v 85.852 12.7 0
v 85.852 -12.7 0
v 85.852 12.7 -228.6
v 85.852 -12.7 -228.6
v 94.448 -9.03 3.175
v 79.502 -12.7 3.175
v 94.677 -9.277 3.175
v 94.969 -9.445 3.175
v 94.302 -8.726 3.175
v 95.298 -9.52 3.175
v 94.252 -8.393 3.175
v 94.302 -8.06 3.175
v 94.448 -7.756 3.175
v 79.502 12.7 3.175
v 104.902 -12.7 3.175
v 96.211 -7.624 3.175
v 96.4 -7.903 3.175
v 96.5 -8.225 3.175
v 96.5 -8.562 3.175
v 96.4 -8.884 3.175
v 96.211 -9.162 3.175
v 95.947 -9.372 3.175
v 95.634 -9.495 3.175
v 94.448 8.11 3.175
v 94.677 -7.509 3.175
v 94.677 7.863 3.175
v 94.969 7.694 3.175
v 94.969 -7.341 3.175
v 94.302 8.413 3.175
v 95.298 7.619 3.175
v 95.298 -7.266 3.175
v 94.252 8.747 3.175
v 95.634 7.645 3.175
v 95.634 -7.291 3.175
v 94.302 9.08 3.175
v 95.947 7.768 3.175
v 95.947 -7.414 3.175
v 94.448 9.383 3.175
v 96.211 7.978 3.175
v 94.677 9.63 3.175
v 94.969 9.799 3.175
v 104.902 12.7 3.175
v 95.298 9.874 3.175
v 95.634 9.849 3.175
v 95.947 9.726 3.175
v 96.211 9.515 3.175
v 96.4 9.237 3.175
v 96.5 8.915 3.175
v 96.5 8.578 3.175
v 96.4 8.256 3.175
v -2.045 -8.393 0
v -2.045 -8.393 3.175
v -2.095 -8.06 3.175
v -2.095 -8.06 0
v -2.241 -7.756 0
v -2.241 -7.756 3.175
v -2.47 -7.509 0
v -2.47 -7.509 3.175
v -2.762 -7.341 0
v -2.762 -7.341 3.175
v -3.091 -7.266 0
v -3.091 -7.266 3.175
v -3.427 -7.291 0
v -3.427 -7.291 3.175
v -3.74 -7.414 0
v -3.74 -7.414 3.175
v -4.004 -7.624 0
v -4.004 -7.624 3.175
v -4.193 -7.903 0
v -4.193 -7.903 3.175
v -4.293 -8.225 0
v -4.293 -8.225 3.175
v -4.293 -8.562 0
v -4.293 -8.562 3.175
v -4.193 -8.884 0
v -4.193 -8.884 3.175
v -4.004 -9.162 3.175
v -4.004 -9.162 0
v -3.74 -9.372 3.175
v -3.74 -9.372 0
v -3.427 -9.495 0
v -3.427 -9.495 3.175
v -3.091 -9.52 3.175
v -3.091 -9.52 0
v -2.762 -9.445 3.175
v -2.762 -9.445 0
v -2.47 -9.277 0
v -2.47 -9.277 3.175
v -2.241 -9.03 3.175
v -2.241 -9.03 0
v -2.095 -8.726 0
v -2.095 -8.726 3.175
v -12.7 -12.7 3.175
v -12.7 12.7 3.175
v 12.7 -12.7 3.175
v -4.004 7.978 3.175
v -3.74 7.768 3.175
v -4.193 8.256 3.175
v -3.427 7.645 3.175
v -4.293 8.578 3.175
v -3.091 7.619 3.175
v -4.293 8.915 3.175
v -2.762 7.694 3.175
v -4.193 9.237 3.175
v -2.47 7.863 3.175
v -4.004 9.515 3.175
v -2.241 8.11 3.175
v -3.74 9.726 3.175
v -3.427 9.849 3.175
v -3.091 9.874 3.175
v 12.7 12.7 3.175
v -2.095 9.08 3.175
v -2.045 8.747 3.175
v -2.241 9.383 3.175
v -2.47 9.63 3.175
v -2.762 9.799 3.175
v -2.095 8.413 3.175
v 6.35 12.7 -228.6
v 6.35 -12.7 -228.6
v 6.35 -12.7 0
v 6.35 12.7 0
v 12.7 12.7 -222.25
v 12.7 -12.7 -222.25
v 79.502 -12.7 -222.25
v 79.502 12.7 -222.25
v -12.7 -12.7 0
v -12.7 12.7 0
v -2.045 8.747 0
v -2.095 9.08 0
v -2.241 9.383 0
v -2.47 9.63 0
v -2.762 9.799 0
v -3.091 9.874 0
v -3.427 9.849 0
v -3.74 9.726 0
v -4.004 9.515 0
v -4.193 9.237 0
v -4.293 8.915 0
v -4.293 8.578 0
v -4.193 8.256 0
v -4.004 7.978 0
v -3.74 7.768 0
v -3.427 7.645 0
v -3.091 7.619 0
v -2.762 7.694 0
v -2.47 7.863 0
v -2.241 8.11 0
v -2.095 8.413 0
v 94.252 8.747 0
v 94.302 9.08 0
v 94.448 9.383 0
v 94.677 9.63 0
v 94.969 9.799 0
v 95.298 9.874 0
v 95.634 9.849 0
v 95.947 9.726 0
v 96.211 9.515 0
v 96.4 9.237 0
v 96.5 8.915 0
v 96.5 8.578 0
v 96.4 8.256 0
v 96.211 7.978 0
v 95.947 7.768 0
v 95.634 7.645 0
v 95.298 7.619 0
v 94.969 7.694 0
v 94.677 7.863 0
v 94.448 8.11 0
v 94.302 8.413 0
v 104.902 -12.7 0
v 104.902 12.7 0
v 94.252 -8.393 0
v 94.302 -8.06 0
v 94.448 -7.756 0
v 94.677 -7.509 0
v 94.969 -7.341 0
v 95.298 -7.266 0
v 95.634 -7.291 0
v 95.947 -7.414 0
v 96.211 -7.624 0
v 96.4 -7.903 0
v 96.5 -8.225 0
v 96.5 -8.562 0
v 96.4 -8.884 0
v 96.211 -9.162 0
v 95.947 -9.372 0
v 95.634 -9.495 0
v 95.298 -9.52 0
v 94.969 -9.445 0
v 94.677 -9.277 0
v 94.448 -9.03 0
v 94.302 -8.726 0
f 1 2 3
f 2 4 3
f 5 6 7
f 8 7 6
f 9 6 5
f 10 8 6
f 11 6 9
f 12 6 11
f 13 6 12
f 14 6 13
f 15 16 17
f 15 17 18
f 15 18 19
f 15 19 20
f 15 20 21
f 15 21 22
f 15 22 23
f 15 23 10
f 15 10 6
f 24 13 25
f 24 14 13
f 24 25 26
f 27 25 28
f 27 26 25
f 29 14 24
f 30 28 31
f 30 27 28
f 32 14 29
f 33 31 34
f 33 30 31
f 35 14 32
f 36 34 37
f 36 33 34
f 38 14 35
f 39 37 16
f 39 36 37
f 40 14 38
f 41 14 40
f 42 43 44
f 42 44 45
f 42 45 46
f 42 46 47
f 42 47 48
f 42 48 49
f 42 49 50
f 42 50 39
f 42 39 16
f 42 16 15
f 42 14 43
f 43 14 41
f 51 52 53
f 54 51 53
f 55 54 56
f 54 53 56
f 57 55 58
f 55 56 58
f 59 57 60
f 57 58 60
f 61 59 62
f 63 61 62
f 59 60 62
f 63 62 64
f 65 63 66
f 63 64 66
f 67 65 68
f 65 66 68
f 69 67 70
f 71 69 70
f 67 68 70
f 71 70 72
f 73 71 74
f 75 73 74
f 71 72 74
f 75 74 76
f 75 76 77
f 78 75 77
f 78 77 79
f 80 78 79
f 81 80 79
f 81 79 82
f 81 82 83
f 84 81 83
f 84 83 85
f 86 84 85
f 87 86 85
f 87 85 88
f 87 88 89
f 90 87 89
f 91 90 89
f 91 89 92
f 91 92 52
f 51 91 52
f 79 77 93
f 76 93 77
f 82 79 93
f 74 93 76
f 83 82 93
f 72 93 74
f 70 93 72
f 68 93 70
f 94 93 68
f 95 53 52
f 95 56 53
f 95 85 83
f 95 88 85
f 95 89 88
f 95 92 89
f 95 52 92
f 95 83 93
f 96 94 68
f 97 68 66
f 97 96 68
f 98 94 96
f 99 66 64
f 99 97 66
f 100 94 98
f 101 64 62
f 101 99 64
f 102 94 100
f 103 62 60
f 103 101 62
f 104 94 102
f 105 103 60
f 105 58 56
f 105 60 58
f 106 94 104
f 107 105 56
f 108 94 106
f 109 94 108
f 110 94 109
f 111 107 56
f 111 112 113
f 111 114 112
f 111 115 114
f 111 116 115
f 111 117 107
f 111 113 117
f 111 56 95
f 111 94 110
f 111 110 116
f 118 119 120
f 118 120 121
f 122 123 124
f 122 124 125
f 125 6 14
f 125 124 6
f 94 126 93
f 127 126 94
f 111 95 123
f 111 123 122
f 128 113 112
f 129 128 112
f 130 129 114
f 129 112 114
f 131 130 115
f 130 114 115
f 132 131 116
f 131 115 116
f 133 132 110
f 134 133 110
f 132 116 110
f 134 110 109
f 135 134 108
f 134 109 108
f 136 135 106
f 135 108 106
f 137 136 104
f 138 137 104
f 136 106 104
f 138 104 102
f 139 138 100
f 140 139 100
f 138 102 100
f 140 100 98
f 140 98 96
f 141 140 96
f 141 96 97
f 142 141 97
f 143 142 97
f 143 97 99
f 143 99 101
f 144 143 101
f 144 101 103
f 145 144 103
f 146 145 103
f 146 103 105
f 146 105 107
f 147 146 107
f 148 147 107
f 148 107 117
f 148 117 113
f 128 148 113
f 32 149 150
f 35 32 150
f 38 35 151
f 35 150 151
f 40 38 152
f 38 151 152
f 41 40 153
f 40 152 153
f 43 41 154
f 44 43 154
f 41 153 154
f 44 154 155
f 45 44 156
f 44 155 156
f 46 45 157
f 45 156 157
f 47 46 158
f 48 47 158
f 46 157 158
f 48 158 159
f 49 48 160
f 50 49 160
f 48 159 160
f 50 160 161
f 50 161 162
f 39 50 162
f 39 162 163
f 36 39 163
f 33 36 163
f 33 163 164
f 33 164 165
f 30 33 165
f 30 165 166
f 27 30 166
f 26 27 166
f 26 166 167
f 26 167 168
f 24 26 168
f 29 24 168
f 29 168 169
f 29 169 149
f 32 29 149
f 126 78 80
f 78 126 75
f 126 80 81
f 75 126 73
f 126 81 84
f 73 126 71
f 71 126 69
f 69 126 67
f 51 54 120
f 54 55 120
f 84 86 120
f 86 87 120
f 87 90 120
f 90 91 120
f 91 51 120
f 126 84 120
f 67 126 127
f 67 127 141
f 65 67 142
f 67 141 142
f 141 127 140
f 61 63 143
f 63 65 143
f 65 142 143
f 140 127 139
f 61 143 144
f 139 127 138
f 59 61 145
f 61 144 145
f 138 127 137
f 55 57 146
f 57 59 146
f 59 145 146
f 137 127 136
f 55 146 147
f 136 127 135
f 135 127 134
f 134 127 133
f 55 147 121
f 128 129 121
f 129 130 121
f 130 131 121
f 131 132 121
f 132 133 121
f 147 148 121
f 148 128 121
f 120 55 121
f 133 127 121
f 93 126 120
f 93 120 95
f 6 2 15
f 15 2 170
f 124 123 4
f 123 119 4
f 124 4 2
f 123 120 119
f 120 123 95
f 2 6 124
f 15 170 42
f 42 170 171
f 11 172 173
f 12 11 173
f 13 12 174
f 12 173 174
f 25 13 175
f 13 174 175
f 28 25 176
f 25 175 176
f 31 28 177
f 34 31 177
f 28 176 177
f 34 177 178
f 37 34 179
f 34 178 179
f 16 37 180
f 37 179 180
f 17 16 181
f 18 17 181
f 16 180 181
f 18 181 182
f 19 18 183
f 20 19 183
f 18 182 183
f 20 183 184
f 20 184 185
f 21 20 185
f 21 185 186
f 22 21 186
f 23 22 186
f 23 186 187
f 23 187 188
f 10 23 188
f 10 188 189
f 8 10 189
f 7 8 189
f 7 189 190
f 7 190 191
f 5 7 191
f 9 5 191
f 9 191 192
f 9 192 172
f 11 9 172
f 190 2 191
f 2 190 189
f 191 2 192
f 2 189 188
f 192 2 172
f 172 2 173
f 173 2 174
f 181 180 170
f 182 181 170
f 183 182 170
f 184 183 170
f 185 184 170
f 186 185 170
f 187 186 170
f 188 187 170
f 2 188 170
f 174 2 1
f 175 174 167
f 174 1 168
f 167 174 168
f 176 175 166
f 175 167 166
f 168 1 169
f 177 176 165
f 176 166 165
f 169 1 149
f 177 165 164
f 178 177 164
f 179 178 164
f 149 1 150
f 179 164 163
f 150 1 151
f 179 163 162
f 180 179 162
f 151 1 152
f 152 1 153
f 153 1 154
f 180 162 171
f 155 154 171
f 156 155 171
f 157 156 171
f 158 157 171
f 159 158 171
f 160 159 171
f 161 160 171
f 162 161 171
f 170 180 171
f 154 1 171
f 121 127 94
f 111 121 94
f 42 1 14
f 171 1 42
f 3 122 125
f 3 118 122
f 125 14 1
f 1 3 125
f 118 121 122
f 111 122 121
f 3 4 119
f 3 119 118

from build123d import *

# Parameters (mm, degrees)
SKETCH1_W             = 25.4
SKETCH1_H             = 25.4
BOSS_EXTRUDE1_DEPTH   = 3.175
SKETCH3_W             = 6.35
SKETCH3_H             = 25.4
BOSS_EXTRUDE2_DEPTH   = 228.6
F_4_40_TAPPED_HOLE1_D = 2.2606
SKETCH7_W             = 6.35
SKETCH7_H             = 25.4
BOSS_EXTRUDE3_DEPTH   = 73.152
SKETCH9_W             = 6.35
SKETCH9_H             = 25.4
BOSS_EXTRUDE4_DEPTH   = 222.25
SKETCH10_W            = 25.4
SKETCH10_H            = 25.4
BOSS_EXTRUDE5_DEPTH   = 3.175
F_4_40_TAPPED_HOLE4_D = 2.2606
BOSS_EXTRUDE6_START   = -3.175
SKETCH16_R            = 1.1303
BOSS_EXTRUDE6_DEPTH   = 3.175


with BuildPart() as part:
    # Sketch1 → Boss-Extrude1 (new body)
    with BuildSketch(Plane.XY):
        Rectangle(SKETCH1_W, SKETCH1_H)
    extrude(amount=BOSS_EXTRUDE1_DEPTH)

    # Sketch3 → Boss-Extrude2 (add)
    with BuildSketch(Plane(origin=(0, 0, 0), x_dir=(-1, 0, 0), z_dir=(0, 0, -1))):
        with Locations((-9.525, 0)):
            Rectangle(SKETCH3_W, SKETCH3_H)
    extrude(amount=BOSS_EXTRUDE2_DEPTH)

    # #4-40 Tapped Hole1 (through all)
    with Locations(Plane(origin=(0, 0, 0), x_dir=(-1, 0, 0), z_dir=(0, 0, -1))):
        with Locations((3.175, 8.746639232), (3.175, -8.393153768)):
            Hole(F_4_40_TAPPED_HOLE1_D / 2)

    # Sketch7 → Boss-Extrude3 (add)
    with BuildSketch(Plane(origin=(12.7, 0, 0), x_dir=(0, 0, -1), z_dir=(1, 0, 0))):
        with Locations((225.425, 0)):
            Rectangle(SKETCH7_W, SKETCH7_H)
    extrude(amount=BOSS_EXTRUDE3_DEPTH)

    # Sketch9 → Boss-Extrude4 (add)
    with BuildSketch(Plane.XY.offset(-222.25)):
        with Locations((82.677, 0)):
            Rectangle(SKETCH9_W, SKETCH9_H)
    extrude(amount=BOSS_EXTRUDE4_DEPTH)

    # Sketch10 → Boss-Extrude5 (add)
    with BuildSketch(Plane.XY):
        with Locations((92.202, 0)):
            Rectangle(SKETCH10_W, SKETCH10_H)
    extrude(amount=BOSS_EXTRUDE5_DEPTH)

    # #4-40 Tapped Hole4 (through all)
    with Locations(Plane.XY.offset(3.175)):
        with Locations((100.484060812, 7.185260309), (95.382, 8.746639232), (95.382, -8.393153768)):
            Hole(F_4_40_TAPPED_HOLE4_D / 2)

    # Sketch16 → Boss-Extrude6 (add)
    with BuildSketch(Plane.XY.offset(3.175).offset(BOSS_EXTRUDE6_START)):
        with Locations((100.484060812, 7.185260309)):
            Circle(SKETCH16_R)
    extrude(amount=BOSS_EXTRUDE6_DEPTH)


solid = part.part
